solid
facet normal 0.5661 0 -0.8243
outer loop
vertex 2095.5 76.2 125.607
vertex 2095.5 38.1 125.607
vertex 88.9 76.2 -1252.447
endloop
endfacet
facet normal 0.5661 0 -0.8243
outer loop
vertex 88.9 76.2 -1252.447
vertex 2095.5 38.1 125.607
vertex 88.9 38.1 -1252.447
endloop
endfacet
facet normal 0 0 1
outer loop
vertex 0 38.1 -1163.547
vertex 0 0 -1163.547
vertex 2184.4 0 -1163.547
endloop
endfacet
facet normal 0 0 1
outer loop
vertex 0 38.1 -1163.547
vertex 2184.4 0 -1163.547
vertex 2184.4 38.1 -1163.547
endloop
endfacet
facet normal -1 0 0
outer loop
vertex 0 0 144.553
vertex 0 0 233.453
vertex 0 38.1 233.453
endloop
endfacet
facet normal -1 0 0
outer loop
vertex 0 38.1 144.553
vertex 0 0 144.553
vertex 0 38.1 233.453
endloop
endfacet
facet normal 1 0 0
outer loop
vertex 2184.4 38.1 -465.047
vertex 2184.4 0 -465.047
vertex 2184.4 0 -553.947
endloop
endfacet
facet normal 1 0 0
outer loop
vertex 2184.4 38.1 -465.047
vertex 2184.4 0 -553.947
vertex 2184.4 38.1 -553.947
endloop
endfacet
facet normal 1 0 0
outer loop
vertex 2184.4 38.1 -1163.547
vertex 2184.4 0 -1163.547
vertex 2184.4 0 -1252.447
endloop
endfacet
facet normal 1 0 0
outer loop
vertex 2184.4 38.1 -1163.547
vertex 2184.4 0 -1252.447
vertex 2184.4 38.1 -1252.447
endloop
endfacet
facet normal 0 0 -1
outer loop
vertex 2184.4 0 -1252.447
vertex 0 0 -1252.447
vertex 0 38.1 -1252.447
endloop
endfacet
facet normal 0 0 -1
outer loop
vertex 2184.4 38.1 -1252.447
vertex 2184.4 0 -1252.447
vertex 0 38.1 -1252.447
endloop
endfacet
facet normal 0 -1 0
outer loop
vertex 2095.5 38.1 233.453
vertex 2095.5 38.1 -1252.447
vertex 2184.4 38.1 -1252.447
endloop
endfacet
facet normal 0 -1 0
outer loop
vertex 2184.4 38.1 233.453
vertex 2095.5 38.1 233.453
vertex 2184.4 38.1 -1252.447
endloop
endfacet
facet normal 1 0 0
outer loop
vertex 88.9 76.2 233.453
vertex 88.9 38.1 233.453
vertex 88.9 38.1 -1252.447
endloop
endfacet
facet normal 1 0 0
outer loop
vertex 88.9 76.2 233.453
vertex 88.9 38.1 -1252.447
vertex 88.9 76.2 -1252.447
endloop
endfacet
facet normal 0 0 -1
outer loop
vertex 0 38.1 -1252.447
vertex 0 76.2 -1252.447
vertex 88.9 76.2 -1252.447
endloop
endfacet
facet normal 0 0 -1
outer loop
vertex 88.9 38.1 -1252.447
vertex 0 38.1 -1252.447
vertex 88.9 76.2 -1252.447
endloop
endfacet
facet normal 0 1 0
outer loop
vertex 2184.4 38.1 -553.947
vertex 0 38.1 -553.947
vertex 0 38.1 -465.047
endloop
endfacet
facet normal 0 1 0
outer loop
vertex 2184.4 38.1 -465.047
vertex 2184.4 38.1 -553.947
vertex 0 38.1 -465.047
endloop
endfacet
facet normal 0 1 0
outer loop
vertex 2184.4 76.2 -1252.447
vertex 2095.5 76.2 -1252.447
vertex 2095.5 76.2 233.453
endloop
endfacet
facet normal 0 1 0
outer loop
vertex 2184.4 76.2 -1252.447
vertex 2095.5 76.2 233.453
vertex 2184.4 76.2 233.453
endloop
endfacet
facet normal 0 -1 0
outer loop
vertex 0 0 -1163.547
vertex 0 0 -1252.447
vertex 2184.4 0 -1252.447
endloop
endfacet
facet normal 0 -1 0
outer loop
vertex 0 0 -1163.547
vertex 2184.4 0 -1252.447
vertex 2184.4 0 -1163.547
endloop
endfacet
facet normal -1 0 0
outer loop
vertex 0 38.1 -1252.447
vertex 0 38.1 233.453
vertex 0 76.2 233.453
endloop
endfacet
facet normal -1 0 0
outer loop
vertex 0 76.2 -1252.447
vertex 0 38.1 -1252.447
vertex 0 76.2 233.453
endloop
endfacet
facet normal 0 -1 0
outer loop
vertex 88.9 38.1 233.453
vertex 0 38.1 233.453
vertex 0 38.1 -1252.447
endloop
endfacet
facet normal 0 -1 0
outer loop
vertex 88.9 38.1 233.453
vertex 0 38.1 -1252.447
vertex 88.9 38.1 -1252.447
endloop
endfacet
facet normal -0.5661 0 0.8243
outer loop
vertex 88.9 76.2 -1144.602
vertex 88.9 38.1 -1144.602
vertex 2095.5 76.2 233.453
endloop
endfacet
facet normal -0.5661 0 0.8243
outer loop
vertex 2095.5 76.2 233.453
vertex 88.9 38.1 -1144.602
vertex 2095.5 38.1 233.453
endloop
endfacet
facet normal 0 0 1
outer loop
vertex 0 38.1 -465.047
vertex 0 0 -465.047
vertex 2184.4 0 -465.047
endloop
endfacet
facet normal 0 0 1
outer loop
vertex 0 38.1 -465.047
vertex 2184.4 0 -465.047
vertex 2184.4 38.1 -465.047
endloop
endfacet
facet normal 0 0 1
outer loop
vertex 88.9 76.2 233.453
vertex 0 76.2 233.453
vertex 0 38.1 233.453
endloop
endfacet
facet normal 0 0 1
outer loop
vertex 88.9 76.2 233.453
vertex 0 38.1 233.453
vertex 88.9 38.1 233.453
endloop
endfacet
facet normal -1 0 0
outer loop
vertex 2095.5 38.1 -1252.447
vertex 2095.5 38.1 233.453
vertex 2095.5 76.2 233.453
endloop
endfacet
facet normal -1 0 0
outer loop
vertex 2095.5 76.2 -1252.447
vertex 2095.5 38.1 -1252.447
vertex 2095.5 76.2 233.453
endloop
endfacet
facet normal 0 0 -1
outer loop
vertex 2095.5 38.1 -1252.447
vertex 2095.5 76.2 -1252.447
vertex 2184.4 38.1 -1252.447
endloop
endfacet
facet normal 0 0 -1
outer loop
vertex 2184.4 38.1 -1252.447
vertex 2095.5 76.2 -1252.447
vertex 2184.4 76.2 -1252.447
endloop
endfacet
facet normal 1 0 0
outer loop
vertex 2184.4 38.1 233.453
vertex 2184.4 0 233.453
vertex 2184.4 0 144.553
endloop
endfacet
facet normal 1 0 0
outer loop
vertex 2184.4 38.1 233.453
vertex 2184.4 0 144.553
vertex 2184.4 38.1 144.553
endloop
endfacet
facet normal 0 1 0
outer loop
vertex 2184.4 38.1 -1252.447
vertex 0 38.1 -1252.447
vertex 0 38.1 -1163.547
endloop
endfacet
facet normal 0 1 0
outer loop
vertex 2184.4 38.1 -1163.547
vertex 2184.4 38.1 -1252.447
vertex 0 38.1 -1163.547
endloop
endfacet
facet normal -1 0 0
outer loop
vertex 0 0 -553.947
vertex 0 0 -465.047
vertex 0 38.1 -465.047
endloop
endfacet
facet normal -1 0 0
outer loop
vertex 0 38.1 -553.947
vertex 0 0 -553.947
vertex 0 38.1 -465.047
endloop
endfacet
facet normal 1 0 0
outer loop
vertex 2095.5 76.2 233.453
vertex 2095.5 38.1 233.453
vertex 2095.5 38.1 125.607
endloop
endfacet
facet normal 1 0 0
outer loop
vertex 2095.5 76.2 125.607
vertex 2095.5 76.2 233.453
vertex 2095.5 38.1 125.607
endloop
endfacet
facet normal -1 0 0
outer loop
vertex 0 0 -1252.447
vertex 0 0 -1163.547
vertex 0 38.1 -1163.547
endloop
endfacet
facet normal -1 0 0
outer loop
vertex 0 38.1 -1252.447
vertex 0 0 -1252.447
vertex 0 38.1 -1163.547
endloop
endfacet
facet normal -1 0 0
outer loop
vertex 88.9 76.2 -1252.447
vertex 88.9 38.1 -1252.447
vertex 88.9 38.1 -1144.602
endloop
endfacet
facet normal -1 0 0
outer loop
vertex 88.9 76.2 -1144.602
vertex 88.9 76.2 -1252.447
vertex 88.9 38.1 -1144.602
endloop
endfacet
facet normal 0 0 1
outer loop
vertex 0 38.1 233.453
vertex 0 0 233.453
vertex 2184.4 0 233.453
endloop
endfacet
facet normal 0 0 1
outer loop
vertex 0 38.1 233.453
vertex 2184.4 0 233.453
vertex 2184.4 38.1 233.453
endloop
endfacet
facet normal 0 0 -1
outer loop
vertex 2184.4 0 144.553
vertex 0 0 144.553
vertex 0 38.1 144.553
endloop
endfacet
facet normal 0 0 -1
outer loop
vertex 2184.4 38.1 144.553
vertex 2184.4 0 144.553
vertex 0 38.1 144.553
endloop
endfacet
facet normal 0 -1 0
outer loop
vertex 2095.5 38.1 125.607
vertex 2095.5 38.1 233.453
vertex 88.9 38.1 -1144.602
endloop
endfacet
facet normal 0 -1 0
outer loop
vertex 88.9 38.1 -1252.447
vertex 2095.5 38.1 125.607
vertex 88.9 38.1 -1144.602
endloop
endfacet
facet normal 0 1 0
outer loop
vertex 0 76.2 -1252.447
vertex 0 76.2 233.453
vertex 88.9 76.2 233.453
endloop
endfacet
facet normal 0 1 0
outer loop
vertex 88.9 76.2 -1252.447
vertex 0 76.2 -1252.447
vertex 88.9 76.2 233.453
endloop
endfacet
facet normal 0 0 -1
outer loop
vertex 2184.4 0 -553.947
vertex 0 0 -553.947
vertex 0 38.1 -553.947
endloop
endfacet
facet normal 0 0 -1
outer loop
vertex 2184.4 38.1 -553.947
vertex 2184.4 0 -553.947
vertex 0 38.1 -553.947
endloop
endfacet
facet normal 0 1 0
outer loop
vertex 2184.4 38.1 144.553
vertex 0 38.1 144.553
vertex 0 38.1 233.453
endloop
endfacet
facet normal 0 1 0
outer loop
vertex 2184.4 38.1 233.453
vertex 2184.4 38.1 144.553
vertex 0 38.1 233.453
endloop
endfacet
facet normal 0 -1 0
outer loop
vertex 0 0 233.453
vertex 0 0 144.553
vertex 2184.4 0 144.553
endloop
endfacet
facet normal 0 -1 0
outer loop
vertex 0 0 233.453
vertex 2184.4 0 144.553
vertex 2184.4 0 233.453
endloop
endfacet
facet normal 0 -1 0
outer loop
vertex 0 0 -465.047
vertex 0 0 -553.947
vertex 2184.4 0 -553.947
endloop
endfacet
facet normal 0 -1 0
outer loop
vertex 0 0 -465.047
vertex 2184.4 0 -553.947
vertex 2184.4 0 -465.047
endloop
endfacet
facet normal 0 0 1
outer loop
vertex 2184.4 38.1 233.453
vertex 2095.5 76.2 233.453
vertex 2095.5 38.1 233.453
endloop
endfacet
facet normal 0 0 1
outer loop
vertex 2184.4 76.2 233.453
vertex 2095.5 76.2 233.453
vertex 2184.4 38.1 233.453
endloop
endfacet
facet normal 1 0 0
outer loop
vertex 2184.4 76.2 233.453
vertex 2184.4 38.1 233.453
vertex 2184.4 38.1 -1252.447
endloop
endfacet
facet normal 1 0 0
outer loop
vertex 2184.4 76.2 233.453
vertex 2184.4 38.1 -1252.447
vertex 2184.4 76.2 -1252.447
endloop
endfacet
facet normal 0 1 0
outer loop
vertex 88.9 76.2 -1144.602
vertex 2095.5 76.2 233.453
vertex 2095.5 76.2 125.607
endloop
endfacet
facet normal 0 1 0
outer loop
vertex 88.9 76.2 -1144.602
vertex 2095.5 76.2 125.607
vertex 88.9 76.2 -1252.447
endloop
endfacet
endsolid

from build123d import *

# Parameters (mm, degrees)
F0_W     = 38.1
F0_H     = 88.9
F1_DEPTH = 2184.4
F2_W     = 88.9
F2_H     = 38.1
F3_DEPTH = 1485.9
F5_DEPTH = 38.1


with BuildPart() as f1:
    # F0 (on Right) → F1 (new body)
    with BuildSketch(Plane.YZ):
        with Locations((19.05, 189.002842)):
            Rectangle(F0_W, F0_H)
        with Locations((19.05, -509.497158)):
            Rectangle(F0_W, F0_H)
        with Locations((19.05, -1207.997158)):
            Rectangle(F0_W, F0_H)
    extrude(amount=F1_DEPTH)


with BuildPart() as f3:
    # F2 (on face) → F3 (new body, through all)
    with BuildSketch(Plane.XY.offset(233.452842)):
        with Locations((2139.95, 57.15)):
            Rectangle(F2_W, F2_H)
        with Locations((44.45, 57.15)):
            Rectangle(F2_W, F2_H)
    extrude(amount=-F3_DEPTH)


with BuildPart() as f5:
    # F4 (on face) → F5 (new body)
    with BuildSketch(Plane(origin=(0, 38.1, 0), x_dir=(-1, 0, 0), z_dir=(0, 1, 0))):
        Polygon((-88.9, -1144.60151), (-2095.5, 233.452842), (-2095.5, 125.607194), (-88.9, -1252.447158), align=None)
    extrude(amount=F5_DEPTH)


solid = Compound([f1.part, f3.part, f5.part])
